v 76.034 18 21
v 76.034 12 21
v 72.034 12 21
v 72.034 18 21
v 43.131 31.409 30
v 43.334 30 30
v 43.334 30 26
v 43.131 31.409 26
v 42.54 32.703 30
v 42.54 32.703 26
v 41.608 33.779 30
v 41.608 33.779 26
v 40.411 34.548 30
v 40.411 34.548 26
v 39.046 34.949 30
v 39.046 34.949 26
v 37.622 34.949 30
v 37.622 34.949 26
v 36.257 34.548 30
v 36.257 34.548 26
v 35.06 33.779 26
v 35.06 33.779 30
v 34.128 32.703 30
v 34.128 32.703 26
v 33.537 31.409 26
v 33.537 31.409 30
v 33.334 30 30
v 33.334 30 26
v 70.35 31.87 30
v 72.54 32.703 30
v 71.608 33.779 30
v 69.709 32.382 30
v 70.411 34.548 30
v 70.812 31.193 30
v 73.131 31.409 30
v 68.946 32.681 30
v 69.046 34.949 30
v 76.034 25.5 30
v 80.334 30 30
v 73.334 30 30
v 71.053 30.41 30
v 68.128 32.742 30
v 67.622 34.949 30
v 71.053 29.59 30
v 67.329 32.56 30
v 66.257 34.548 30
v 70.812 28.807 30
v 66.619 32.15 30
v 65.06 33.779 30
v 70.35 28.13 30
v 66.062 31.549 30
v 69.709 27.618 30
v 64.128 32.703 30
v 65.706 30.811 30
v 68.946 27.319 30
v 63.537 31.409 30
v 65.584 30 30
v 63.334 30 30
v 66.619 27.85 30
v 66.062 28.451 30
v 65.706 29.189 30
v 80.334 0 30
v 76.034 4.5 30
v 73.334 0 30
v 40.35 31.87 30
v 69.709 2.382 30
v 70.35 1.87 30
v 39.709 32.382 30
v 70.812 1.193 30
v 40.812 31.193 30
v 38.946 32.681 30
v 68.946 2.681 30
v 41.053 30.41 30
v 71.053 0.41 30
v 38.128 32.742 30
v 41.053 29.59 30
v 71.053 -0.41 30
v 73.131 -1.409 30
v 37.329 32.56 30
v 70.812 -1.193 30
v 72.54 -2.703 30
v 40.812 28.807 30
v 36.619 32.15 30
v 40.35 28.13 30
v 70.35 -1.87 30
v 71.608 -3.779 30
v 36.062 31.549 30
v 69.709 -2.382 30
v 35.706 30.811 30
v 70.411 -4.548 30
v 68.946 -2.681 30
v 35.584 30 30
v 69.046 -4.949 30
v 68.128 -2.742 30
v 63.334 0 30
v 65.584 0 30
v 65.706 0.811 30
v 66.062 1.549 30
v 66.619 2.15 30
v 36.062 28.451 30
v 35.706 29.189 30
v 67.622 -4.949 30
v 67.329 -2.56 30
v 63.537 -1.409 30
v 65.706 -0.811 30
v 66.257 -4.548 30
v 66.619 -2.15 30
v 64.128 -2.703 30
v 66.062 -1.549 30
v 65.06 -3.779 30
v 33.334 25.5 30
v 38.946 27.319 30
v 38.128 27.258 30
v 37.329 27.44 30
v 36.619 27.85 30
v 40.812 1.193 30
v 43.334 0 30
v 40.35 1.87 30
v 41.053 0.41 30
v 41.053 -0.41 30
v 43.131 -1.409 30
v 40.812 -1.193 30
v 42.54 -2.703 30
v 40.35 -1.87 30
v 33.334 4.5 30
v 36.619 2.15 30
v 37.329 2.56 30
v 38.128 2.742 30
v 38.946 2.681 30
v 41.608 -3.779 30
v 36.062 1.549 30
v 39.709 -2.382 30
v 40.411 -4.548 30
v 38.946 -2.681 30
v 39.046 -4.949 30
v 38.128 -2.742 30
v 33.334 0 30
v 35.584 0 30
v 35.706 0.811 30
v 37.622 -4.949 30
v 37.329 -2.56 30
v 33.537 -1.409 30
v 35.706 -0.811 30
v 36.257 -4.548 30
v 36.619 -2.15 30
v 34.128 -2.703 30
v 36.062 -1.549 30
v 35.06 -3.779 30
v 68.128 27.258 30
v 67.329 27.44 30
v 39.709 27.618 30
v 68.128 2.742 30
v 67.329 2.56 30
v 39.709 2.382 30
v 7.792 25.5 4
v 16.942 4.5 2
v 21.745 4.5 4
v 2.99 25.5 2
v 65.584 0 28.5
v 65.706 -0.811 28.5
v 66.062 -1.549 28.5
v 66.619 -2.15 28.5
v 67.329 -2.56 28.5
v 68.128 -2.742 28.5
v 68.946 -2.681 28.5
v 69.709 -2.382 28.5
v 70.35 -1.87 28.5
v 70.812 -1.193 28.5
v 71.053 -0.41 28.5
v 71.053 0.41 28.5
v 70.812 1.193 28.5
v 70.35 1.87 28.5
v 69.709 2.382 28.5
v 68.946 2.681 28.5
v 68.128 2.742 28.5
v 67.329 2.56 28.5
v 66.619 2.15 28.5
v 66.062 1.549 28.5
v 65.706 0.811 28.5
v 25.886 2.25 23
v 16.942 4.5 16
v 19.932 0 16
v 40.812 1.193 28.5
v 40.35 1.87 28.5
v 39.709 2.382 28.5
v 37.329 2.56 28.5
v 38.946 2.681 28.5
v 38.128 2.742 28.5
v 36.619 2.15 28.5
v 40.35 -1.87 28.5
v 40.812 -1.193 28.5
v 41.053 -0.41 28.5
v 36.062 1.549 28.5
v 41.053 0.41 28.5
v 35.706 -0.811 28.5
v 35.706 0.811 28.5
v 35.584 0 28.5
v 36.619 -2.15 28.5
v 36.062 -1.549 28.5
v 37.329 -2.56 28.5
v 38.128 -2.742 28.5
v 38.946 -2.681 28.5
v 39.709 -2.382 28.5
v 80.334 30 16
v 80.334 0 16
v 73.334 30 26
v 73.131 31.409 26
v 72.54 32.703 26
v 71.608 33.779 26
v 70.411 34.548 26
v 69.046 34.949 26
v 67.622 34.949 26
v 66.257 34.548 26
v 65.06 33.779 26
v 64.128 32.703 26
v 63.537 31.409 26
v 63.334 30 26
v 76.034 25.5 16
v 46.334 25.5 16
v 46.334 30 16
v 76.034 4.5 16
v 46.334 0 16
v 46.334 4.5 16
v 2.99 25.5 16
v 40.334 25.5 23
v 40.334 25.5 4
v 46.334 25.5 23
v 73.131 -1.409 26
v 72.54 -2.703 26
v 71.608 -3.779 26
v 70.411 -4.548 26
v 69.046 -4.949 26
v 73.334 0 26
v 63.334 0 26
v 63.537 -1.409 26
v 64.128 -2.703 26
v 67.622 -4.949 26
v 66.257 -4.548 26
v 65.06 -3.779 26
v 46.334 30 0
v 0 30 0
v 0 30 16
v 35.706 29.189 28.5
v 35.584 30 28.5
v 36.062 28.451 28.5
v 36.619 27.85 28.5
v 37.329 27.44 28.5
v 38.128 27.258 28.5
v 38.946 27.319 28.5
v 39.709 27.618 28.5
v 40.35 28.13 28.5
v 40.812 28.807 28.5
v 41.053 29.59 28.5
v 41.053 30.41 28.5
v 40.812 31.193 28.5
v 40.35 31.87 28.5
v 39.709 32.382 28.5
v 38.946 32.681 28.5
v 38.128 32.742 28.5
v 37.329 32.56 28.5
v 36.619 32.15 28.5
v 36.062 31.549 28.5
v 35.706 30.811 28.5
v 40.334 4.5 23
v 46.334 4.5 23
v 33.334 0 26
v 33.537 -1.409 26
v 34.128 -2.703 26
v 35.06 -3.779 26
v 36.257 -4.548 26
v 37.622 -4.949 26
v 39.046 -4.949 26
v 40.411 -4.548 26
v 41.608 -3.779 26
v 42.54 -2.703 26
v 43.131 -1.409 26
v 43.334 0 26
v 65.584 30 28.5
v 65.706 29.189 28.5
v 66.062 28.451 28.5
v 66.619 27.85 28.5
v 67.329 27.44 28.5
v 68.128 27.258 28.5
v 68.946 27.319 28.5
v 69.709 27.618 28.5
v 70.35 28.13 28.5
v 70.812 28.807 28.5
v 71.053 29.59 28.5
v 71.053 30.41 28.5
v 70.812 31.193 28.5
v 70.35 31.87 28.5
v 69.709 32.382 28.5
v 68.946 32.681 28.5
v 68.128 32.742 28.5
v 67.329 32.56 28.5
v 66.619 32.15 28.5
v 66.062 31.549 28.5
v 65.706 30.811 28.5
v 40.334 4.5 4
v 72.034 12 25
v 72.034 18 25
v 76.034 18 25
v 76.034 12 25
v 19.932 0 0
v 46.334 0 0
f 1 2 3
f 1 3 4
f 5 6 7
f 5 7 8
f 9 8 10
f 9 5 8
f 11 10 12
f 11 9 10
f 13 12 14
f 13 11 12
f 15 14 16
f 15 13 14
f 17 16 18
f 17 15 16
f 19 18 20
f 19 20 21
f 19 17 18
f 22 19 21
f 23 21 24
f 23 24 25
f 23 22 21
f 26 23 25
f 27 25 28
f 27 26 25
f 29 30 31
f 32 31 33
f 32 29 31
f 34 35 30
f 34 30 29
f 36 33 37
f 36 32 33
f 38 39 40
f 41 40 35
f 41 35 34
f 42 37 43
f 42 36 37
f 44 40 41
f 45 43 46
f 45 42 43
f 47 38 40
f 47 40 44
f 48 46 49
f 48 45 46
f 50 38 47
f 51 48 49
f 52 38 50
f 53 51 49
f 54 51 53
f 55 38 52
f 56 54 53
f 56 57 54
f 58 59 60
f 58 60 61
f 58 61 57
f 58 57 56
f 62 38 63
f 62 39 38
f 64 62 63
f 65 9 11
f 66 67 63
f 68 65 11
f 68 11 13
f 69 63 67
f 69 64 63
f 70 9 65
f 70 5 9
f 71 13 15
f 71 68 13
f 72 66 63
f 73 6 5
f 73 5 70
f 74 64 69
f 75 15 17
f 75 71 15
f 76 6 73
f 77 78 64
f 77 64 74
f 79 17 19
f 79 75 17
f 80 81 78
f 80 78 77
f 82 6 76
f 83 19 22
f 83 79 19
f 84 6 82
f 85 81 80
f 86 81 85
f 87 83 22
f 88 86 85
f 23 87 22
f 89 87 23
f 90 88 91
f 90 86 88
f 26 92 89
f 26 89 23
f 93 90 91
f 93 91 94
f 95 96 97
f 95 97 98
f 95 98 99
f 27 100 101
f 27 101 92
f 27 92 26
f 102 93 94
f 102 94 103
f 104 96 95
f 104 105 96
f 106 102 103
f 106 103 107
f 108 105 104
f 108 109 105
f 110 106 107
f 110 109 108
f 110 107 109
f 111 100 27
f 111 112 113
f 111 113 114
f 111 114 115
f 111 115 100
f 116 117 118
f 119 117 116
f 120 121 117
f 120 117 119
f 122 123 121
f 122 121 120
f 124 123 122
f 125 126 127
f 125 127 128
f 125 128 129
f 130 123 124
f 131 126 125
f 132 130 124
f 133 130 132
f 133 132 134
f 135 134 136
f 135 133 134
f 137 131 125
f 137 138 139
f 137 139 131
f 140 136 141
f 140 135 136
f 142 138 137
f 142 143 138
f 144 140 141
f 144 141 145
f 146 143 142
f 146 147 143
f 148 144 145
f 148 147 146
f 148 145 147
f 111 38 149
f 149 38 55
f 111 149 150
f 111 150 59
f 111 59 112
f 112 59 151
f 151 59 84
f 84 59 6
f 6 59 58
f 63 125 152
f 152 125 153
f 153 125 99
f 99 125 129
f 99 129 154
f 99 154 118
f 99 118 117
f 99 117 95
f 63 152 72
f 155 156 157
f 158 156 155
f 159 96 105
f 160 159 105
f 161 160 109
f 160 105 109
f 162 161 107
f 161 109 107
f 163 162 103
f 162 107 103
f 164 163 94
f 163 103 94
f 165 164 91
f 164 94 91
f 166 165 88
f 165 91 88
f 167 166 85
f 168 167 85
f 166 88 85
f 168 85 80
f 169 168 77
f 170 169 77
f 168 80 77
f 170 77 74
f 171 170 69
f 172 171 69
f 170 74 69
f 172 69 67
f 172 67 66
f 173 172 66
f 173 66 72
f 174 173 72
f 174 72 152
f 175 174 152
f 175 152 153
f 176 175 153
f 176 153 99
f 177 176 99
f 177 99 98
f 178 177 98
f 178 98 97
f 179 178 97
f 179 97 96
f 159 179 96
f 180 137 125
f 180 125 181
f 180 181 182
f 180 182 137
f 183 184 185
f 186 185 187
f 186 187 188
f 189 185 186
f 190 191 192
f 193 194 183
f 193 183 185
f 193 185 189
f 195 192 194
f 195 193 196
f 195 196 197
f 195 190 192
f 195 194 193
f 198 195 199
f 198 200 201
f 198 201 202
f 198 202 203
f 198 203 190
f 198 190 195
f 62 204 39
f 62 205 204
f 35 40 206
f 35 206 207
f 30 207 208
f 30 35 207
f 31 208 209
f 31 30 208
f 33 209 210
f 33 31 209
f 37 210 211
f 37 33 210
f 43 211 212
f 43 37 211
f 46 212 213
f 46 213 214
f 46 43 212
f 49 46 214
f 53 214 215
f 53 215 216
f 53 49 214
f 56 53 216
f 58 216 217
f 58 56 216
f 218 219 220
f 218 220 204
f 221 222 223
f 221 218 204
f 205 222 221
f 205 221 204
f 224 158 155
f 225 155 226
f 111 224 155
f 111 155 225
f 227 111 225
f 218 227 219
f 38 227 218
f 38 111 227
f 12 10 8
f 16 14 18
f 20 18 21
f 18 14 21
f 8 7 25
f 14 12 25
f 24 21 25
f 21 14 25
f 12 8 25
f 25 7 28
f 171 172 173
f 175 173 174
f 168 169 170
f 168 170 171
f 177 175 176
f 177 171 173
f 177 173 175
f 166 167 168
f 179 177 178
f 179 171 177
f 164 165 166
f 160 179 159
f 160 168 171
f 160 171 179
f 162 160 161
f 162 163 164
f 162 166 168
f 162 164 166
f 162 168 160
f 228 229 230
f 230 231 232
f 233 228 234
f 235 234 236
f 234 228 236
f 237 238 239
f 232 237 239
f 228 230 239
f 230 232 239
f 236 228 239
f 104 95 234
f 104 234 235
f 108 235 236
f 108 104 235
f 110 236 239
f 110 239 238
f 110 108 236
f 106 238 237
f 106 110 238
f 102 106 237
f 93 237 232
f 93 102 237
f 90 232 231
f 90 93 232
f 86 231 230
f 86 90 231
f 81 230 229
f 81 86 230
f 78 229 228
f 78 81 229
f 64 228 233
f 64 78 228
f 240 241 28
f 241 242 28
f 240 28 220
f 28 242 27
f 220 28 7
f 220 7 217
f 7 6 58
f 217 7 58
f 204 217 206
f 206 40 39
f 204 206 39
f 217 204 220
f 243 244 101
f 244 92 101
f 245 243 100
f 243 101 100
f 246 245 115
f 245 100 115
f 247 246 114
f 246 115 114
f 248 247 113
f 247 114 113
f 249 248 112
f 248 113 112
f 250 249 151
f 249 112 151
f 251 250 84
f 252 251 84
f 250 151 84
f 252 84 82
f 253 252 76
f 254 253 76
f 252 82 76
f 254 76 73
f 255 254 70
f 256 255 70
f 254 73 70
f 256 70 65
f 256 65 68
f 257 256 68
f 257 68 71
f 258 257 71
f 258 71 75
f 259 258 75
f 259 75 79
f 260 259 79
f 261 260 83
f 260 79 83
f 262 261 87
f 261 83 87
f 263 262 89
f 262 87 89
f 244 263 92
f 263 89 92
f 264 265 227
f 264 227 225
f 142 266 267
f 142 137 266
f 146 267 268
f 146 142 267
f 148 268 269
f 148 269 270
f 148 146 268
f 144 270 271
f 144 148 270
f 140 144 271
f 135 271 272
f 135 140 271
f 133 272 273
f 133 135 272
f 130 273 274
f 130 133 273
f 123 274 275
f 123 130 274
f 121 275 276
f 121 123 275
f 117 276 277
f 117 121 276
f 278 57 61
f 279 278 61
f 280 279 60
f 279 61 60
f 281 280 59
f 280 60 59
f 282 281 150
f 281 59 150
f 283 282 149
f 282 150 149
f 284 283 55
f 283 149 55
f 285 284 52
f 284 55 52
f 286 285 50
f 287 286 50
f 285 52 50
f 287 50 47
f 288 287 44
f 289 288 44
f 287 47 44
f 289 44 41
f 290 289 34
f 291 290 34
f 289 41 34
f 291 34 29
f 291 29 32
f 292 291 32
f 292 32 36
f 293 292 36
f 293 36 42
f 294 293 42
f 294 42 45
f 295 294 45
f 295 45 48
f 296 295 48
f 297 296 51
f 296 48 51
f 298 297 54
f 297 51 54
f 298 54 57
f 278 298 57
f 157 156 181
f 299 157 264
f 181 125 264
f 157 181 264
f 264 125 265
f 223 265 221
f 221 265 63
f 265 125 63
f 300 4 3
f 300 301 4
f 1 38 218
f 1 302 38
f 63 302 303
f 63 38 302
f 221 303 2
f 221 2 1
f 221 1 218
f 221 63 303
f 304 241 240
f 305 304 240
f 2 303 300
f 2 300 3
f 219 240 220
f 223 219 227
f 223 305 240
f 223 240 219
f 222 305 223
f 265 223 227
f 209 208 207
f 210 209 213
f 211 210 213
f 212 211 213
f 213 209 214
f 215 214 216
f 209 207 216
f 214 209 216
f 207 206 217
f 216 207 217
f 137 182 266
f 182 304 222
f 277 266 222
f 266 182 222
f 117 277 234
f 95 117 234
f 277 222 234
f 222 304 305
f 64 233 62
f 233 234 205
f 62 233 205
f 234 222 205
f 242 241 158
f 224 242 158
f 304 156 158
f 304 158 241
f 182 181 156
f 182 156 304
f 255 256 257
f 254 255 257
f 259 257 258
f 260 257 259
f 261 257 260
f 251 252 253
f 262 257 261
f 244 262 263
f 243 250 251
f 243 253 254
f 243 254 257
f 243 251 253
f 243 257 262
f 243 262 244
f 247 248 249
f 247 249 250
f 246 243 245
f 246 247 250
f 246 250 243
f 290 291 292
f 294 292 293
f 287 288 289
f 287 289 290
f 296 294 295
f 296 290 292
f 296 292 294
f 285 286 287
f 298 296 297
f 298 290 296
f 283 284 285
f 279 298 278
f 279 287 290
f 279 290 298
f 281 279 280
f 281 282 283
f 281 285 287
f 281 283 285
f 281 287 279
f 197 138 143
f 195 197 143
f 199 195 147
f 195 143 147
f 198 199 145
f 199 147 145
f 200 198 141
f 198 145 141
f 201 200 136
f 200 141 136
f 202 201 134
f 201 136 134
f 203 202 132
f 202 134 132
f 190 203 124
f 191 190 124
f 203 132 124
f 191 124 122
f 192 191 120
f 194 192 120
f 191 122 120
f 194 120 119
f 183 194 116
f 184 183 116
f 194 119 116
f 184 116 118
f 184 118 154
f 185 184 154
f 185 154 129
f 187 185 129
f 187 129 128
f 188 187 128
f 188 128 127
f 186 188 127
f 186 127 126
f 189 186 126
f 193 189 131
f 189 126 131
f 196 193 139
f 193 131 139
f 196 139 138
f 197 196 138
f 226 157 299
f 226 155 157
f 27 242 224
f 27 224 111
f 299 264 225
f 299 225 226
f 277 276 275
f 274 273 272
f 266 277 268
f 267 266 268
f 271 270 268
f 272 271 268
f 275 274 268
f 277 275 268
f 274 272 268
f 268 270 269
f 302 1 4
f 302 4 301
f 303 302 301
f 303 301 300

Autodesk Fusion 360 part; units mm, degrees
sketch "Base" plane through (0, 0, 0) normal (0, 0, 1) x (1, 0, 0)
  line L0 (0, 0) -> (46.334, 0)
  line L1 (46.334, 0) -> (46.334, 30)
  line L2 (46.334, 30) -> (0, 30)
  line L3 (0, 30) -> (0, 0)
  dimension "d2" = 46.334
  dimension "d3" = 30
extrude "Extrude1" add sketch "Base" along normal blind 4
sketch "Side Profile" plane through (0, 0, 0) normal (0, -1, 0) x (1, 0, 0)
  line L0 (0, 0) -> (46.334, 0)
  line L1 (46.334, 0) -> (46.334, 4)
  line L2 (46.334, 4) -> (0, 4)
  line L3 (0, 4) -> (0, 0)
  line L4 (46.334, 4) -> (46.334, 16)
  line L5 (46.334, 16) -> (80.334, 16)
  line L6 (80.334, 16) -> (80.334, 30)
  line L7 (80.334, 30) -> (0, 30)
  line L8 (0, 30) -> (0, 4)
  dimension "d6" = 12
  dimension "d7" = 34
  dimension "d8" = 14
  dimension "d11" = 46.334
  dimension "d52" = 80.334
extrude "Extrude2" add sketch "Side Profile" against normal blind 4.5 contours L2 L4 L5 L6 L7 L8
extrude "Extrude3" add sketch "Side Profile" against normal blind 4.5 from surface at -25.5 contours L2 L4 L5 L6 L7 L8
sketch "Front End" plane through (0, 0, 0) normal (0, -1, 0) x (1, 0, 0)
  line L0 (0, 0) -> (46.334, 0)
  line L1 (46.334, 0) -> (46.334, 16)
  line L2 (46.334, 16) -> (80.334, 16)
  line L3 (80.334, 16) -> (80.334, 30)
  line L4 (80.334, 30) -> (0, 30)
  line L5 (0, 30) -> (0, 0)
  line L6 (80.334, 30) -> (76.034, 30)
  line L7 (76.034, 30) -> (76.034, 16)
  line L8 (76.034, 16) -> (80.334, 16)
  line L9 (80.334, 16) -> (80.334, 30)
  dimension "d17" = 4.3
extrude "Extrude4" add sketch "Front End" against normal blind 30 contours L2 L3 L4 L6 L7 L8 L9
sketch "Middle End" plane through (0, 0, 0) normal (0, -1, 0) x (1, 0, 0)
  line L0 (80.334, 30) -> (0, 30)
  line L1 (0, 30) -> (0, 0)
  line L2 (0, 0) -> (46.334, 0)
  line L3 (46.334, 0) -> (46.334, 16)
  line L4 (46.334, 16) -> (80.334, 16)
  line L5 (80.334, 16) -> (80.334, 30)
  line L6 (46.334, 23) -> (40.334, 23)
  line L7 (40.334, 23) -> (40.334, 0)
  line L8 (40.334, 0) -> (46.334, 0)
  line L9 (46.334, 0) -> (46.334, 23)
  dimension "d20" = 7
  dimension "d21" = 6
extrude "Extrude5" add sketch "Middle End" against normal blind 30 contours L2 L3 L6 L7 L8 L9
sketch "Lip" plane through (76.034, 0, 0) normal (-1, 0, 0) x (0, -1, 0)
  line L0 (-25.5, 30) -> (-25.5, 16)
  line L1 (-25.5, 16) -> (-4.5, 16)
  line L2 (-4.5, 16) -> (-4.5, 30)
  line L3 (-4.5, 30) -> (-25.5, 30)
  line L4 (-18, 25) -> (-12, 25)
  line L5 (-12, 25) -> (-12, 21)
  line L6 (-12, 21) -> (-18, 21)
  line L7 (-18, 21) -> (-18, 25)
  dimension "d24" = 5
  dimension "d25" = 6
  dimension "d26" = 4
  dimension "d27" = 7.5
extrude "Extrude6" add sketch "Lip" along normal blind 4 contours L4 L5 L6 L7
sketch "Magnet Holders" plane through (0, 0, 30) normal (0, 0, 1) x (-1, 0, 0)
  line L0 (-80.334, -30) -> (0, -30)
  line L1 (0, -30) -> (0, -25.5)
  line L2 (0, -25.5) -> (-76.034, -25.5)
  line L3 (-76.034, -25.5) -> (-76.034, -4.5)
  line L4 (-76.034, -4.5) -> (0, -4.5)
  line L5 (0, -4.5) -> (0, 0)
  line L6 (0, 0) -> (-80.334, 0)
  line L7 (-80.334, 0) -> (-80.334, -30)
  circle A0 centre (-68.334, -30) radius 5
  circle A1 centre (-38.334, -30) radius 5
  circle A2 centre (-38.334, 0) radius 5
  circle A3 centre (-68.334, 0) radius 5
  circle A4 centre (-38.334, 0) radius 2.75
  circle A5 centre (-68.334, 0) radius 2.75
  circle A6 centre (-38.334, -30) radius 2.75
  circle A7 centre (-68.334, -30) radius 2.75
  dimension "d33" = 10
  dimension "d34" = 10
  dimension "d35" = 10
  dimension "d36" = 10
  dimension "d37" = 12
  dimension "d38" = 12
  dimension "d43" = 5.5
  dimension "d44" = 5.5
  dimension "d45" = 5.5
  dimension "d46" = 5.5
  dimension "d50" = 42
  dimension "d51" = 42
extrude "Extrude8" add sketch "Magnet Holders" against normal blind 4 contours L0 A7 | L0 A0 A7 | L0 A1 A6 | L0 A6 | L6 A3 A5 | L6 A5 | L6 A2 A4 | L6 A4 picked at (-68.2655, -30.9141) picked at (-37.4674, -30.6679) picked at (-68.2655, 0.9141) picked at (-39.0365, 1.0303)
extrude "Extrude9" cut sketch "Magnet Holders" against normal blind 1.5 contours L0 A7 | L0 A7 | L0 A6 | L0 A6 | L6 A5 | L6 A5 | L6 A4 | L6 A4
sketch "Conduit Angle" plane through (0, 0, 30) normal (0, 0, 1) x (-1, 0, 0)
  circle A0 centre (-68.334, 0) radius 2.75
  circle A1 centre (-38.334, -30) radius 2.75
  circle A2 centre (-38.334, 0) radius 2.75
  circle A3 centre (-68.334, -30) radius 2.75
  line L0 (-33.334, -30) -> (0, -30)
  line L1 (0, -30) -> (0, -25.5)
  line L2 (0, -25.5) -> (-76.034, -25.5)
  line L3 (-76.034, -25.5) -> (-76.034, -4.5)
  line L4 (-76.034, -4.5) -> (0, -4.5)
  line L5 (0, -4.5) -> (0, 0)
  line L6 (0, 0) -> (-33.334, 0)
  arc A4 (-33.334, 0) -> (-43.334, 0) centre (-38.334, 0) ccw
  line L7 (-43.334, 0) -> (-63.334, 0)
  arc A5 (-63.334, 0) -> (-73.334, 0) centre (-68.334, 0) ccw
  line L8 (-73.334, 0) -> (-80.334, 0)
  line L9 (-80.334, 0) -> (-80.334, -30)
  line L10 (-80.334, -30) -> (-73.334, -30)
  arc A6 (-73.334, -30) -> (-63.334, -30) centre (-68.334, -30) ccw
  line L11 (-63.334, -30) -> (-43.334, -30)
  arc A7 (-43.334, -30) -> (-33.334, -30) centre (-38.334, -30) ccw
  line L12 (-40.334, -4.5) -> (-40.334, -25.5)
  line L13 (-40.334, -25.5) -> (0, -25.5)
  line L14 (0, -25.5) -> (0, -4.5)
  line L15 (0, -4.5) -> (-40.334, -4.5)
  line L16 (0, -30) -> (-19.932, 0)
  dimension "d53" = 33.6
extrude "Extrude10" cut sketch "Conduit Angle" against normal blind 30 contours L1 L2 L13 L16 | L2 L4 L13 L14 L15 L16 | L4 L5 L6 L15 L16
sketch "Conduit Height" plane through (13.8279, 9.1873, 0) normal (-0.8329, -0.5534, 0) x (0.5534, -0.8329, 0)
  line L0 (-19.585, 4) -> (-19.585, 30)
  line L1 (-19.585, 30) -> (-24.9876, 30)
  line L2 (-24.9876, 30) -> (-24.9876, 0)
  line L3 (-24.9876, 0) -> (11.0302, 0)
  line L4 (11.0302, 0) -> (11.0302, 30)
  line L5 (11.0302, 30) -> (5.6275, 30)
  line L6 (5.6275, 30) -> (5.6275, 4)
  line L7 (5.6275, 4) -> (-19.585, 4)
  line L8 (-24.9876, 0) -> (11.0302, 0)
  line L9 (11.0302, 0) -> (11.0302, 16)
  line L10 (11.0302, 16) -> (-24.9876, 16)
  line L11 (-24.9876, 16) -> (-24.9876, 0)
  point P0 (5.6275, 16)
  point P1 (-19.585, 16)
  dimension "d56" = 16
sketch "Colour Sensor Cover Shape" plane through (0, 0, 30) normal (0, 0, 1) x (-1, 0, 0)
  line L0 (0, -30) -> (-2.9898, -25.5)
  line L1 (-2.9898, -25.5) -> (-76.034, -25.5)
  line L2 (-76.034, -25.5) -> (-76.034, -4.5)
  line L3 (-76.034, -4.5) -> (-16.9422, -4.5)
  line L4 (-16.9422, -4.5) -> (-19.932, 0)
  line L5 (-19.932, 0) -> (-33.334, 0)
  arc A0 (-33.334, 0) -> (-43.334, 0) centre (-38.334, 0) ccw
  line L6 (-43.334, 0) -> (-63.334, 0)
  arc A1 (-63.334, 0) -> (-73.334, 0) centre (-68.334, 0) ccw
  line L7 (-73.334, 0) -> (-80.334, 0)
  line L8 (-80.334, 0) -> (-80.334, -30)
  line L9 (-80.334, -30) -> (-73.334, -30)
  arc A2 (-73.334, -30) -> (-63.334, -30) centre (-68.334, -30) ccw
  line L10 (-63.334, -30) -> (-43.334, -30)
  arc A3 (-43.334, -30) -> (-33.334, -30) centre (-38.334, -30) ccw
  line L11 (-33.334, -30) -> (0, -30)
  circle A4 centre (-68.334, 0) radius 2.75
  circle A5 centre (-38.334, -30) radius 2.75
  circle A6 centre (-38.334, 0) radius 2.75
  circle A7 centre (-68.334, -30) radius 2.75
  line L12 (-33.334, -30) -> (-33.334, 0)
  point P0 (-33.334, -25.5)
  point P1 (-33.334, -4.5)
sketch "Right Loft Outside Shape" plane through (0, 0, 0) normal (0, -1, 0) x (1, 0, 0)
  line L0 (19.932, 30) -> (19.932, 0)
  line L1 (19.932, 0) -> (46.334, 0)
  line L2 (46.334, 0) -> (46.334, 16)
  line L3 (46.334, 16) -> (80.334, 16)
  line L4 (80.334, 16) -> (80.334, 30)
  line L5 (80.334, 30) -> (73.334, 30)
  line L6 (73.334, 30) -> (73.334, 26)
  line L7 (73.334, 26) -> (63.334, 26)
  line L8 (63.334, 26) -> (63.334, 30)
  line L9 (63.334, 30) -> (43.334, 30)
  line L10 (43.334, 30) -> (43.334, 26)
  line L11 (43.334, 26) -> (33.334, 26)
  line L12 (33.334, 26) -> (33.334, 30)
  line L13 (33.334, 30) -> (19.932, 30)
  line L14 (33.334, 30) -> (19.932, 16)
  point P0 (33.334, 30)
  point P1 (19.932, 16)
sketch "Right Loft Inside Shape" plane through (0, 4.5, 0) normal (0, 1, 0) x (-1, 0, 0)
  line L0 (-16.9422, 4) -> (-16.9422, 30)
  line L1 (-16.9422, 30) -> (-76.034, 30)
  line L2 (-76.034, 30) -> (-76.034, 16)
  line L3 (-76.034, 16) -> (-46.334, 16)
  line L4 (-46.334, 16) -> (-46.334, 23)
  line L5 (-46.334, 23) -> (-40.334, 23)
  line L6 (-40.334, 23) -> (-40.334, 4)
  line L7 (-40.334, 4) -> (-16.9422, 4)
  line L8 (-33.334, 30) -> (-16.9422, 16)
  point P0 (-33.334, 30)
  point P1 (-16.9422, 16)
sketch "Left Loft Inside Shape" plane through (0, 25.5, 0) normal (0, -1, 0) x (1, 0, 0)
  line L0 (2.9898, 30) -> (2.9898, 4)
  line L1 (2.9898, 4) -> (40.334, 4)
  line L2 (40.334, 4) -> (40.334, 23)
  line L3 (40.334, 23) -> (46.334, 23)
  line L4 (46.334, 23) -> (46.334, 16)
  line L5 (46.334, 16) -> (76.034, 16)
  line L6 (76.034, 16) -> (76.034, 30)
  line L7 (76.034, 30) -> (2.9898, 30)
  line L8 (33.334, 30) -> (2.9898, 16)
  point P0 (33.334, 30)
  point P1 (2.9898, 16)
sketch "Left Loft Outside Shape" plane through (0, 30, 0) normal (0, 1, 0) x (-1, 0, 0)
  line L0 (-33.334, 30) -> (-33.334, 26)
  line L1 (-33.334, 26) -> (-43.334, 26)
  line L2 (-43.334, 26) -> (-43.334, 30)
  line L3 (-43.334, 30) -> (-63.334, 30)
  line L4 (-63.334, 30) -> (-63.334, 26)
  line L5 (-63.334, 26) -> (-73.334, 26)
  line L6 (-73.334, 26) -> (-73.334, 30)
  line L7 (-73.334, 30) -> (-80.334, 30)
  line L8 (-80.334, 30) -> (-80.334, 16)
  line L9 (-80.334, 16) -> (-46.334, 16)
  line L10 (-46.334, 16) -> (-46.334, 0)
  line L11 (-46.334, 0) -> (0, 0)
  line L12 (0, 0) -> (0, 30)
  line L13 (0, 30) -> (-33.334, 30)
  line L14 (-33.334, 30) -> (0, 16)
  point P0 (-33.334, 30)
  point P1 (0, 16)
loft "Loft1" cut profiles "Right Loft Outside Shape", "Right Loft Inside Shape" section 1 contours L0 L13 L14 section 2 contours L0 L1 L8
loft "Loft2" cut profiles "Left Loft Inside Shape", "Left Loft Outside Shape" section 1 contours L0 L7 L8 section 2 contours L12 L13 L14
chamfer "Chamfer2" distance 4 distance2 2 1 edges at (9.966, 15, 4) measured on face at (20.0887, 18.5, 4)
equation "base_plate_thickness = 4 mm"
equation "d4 = base_plate_thickness"
equation "d37 = 7 mm + 5 mm"
equation "d38 = 7 mm + 5 mm"
